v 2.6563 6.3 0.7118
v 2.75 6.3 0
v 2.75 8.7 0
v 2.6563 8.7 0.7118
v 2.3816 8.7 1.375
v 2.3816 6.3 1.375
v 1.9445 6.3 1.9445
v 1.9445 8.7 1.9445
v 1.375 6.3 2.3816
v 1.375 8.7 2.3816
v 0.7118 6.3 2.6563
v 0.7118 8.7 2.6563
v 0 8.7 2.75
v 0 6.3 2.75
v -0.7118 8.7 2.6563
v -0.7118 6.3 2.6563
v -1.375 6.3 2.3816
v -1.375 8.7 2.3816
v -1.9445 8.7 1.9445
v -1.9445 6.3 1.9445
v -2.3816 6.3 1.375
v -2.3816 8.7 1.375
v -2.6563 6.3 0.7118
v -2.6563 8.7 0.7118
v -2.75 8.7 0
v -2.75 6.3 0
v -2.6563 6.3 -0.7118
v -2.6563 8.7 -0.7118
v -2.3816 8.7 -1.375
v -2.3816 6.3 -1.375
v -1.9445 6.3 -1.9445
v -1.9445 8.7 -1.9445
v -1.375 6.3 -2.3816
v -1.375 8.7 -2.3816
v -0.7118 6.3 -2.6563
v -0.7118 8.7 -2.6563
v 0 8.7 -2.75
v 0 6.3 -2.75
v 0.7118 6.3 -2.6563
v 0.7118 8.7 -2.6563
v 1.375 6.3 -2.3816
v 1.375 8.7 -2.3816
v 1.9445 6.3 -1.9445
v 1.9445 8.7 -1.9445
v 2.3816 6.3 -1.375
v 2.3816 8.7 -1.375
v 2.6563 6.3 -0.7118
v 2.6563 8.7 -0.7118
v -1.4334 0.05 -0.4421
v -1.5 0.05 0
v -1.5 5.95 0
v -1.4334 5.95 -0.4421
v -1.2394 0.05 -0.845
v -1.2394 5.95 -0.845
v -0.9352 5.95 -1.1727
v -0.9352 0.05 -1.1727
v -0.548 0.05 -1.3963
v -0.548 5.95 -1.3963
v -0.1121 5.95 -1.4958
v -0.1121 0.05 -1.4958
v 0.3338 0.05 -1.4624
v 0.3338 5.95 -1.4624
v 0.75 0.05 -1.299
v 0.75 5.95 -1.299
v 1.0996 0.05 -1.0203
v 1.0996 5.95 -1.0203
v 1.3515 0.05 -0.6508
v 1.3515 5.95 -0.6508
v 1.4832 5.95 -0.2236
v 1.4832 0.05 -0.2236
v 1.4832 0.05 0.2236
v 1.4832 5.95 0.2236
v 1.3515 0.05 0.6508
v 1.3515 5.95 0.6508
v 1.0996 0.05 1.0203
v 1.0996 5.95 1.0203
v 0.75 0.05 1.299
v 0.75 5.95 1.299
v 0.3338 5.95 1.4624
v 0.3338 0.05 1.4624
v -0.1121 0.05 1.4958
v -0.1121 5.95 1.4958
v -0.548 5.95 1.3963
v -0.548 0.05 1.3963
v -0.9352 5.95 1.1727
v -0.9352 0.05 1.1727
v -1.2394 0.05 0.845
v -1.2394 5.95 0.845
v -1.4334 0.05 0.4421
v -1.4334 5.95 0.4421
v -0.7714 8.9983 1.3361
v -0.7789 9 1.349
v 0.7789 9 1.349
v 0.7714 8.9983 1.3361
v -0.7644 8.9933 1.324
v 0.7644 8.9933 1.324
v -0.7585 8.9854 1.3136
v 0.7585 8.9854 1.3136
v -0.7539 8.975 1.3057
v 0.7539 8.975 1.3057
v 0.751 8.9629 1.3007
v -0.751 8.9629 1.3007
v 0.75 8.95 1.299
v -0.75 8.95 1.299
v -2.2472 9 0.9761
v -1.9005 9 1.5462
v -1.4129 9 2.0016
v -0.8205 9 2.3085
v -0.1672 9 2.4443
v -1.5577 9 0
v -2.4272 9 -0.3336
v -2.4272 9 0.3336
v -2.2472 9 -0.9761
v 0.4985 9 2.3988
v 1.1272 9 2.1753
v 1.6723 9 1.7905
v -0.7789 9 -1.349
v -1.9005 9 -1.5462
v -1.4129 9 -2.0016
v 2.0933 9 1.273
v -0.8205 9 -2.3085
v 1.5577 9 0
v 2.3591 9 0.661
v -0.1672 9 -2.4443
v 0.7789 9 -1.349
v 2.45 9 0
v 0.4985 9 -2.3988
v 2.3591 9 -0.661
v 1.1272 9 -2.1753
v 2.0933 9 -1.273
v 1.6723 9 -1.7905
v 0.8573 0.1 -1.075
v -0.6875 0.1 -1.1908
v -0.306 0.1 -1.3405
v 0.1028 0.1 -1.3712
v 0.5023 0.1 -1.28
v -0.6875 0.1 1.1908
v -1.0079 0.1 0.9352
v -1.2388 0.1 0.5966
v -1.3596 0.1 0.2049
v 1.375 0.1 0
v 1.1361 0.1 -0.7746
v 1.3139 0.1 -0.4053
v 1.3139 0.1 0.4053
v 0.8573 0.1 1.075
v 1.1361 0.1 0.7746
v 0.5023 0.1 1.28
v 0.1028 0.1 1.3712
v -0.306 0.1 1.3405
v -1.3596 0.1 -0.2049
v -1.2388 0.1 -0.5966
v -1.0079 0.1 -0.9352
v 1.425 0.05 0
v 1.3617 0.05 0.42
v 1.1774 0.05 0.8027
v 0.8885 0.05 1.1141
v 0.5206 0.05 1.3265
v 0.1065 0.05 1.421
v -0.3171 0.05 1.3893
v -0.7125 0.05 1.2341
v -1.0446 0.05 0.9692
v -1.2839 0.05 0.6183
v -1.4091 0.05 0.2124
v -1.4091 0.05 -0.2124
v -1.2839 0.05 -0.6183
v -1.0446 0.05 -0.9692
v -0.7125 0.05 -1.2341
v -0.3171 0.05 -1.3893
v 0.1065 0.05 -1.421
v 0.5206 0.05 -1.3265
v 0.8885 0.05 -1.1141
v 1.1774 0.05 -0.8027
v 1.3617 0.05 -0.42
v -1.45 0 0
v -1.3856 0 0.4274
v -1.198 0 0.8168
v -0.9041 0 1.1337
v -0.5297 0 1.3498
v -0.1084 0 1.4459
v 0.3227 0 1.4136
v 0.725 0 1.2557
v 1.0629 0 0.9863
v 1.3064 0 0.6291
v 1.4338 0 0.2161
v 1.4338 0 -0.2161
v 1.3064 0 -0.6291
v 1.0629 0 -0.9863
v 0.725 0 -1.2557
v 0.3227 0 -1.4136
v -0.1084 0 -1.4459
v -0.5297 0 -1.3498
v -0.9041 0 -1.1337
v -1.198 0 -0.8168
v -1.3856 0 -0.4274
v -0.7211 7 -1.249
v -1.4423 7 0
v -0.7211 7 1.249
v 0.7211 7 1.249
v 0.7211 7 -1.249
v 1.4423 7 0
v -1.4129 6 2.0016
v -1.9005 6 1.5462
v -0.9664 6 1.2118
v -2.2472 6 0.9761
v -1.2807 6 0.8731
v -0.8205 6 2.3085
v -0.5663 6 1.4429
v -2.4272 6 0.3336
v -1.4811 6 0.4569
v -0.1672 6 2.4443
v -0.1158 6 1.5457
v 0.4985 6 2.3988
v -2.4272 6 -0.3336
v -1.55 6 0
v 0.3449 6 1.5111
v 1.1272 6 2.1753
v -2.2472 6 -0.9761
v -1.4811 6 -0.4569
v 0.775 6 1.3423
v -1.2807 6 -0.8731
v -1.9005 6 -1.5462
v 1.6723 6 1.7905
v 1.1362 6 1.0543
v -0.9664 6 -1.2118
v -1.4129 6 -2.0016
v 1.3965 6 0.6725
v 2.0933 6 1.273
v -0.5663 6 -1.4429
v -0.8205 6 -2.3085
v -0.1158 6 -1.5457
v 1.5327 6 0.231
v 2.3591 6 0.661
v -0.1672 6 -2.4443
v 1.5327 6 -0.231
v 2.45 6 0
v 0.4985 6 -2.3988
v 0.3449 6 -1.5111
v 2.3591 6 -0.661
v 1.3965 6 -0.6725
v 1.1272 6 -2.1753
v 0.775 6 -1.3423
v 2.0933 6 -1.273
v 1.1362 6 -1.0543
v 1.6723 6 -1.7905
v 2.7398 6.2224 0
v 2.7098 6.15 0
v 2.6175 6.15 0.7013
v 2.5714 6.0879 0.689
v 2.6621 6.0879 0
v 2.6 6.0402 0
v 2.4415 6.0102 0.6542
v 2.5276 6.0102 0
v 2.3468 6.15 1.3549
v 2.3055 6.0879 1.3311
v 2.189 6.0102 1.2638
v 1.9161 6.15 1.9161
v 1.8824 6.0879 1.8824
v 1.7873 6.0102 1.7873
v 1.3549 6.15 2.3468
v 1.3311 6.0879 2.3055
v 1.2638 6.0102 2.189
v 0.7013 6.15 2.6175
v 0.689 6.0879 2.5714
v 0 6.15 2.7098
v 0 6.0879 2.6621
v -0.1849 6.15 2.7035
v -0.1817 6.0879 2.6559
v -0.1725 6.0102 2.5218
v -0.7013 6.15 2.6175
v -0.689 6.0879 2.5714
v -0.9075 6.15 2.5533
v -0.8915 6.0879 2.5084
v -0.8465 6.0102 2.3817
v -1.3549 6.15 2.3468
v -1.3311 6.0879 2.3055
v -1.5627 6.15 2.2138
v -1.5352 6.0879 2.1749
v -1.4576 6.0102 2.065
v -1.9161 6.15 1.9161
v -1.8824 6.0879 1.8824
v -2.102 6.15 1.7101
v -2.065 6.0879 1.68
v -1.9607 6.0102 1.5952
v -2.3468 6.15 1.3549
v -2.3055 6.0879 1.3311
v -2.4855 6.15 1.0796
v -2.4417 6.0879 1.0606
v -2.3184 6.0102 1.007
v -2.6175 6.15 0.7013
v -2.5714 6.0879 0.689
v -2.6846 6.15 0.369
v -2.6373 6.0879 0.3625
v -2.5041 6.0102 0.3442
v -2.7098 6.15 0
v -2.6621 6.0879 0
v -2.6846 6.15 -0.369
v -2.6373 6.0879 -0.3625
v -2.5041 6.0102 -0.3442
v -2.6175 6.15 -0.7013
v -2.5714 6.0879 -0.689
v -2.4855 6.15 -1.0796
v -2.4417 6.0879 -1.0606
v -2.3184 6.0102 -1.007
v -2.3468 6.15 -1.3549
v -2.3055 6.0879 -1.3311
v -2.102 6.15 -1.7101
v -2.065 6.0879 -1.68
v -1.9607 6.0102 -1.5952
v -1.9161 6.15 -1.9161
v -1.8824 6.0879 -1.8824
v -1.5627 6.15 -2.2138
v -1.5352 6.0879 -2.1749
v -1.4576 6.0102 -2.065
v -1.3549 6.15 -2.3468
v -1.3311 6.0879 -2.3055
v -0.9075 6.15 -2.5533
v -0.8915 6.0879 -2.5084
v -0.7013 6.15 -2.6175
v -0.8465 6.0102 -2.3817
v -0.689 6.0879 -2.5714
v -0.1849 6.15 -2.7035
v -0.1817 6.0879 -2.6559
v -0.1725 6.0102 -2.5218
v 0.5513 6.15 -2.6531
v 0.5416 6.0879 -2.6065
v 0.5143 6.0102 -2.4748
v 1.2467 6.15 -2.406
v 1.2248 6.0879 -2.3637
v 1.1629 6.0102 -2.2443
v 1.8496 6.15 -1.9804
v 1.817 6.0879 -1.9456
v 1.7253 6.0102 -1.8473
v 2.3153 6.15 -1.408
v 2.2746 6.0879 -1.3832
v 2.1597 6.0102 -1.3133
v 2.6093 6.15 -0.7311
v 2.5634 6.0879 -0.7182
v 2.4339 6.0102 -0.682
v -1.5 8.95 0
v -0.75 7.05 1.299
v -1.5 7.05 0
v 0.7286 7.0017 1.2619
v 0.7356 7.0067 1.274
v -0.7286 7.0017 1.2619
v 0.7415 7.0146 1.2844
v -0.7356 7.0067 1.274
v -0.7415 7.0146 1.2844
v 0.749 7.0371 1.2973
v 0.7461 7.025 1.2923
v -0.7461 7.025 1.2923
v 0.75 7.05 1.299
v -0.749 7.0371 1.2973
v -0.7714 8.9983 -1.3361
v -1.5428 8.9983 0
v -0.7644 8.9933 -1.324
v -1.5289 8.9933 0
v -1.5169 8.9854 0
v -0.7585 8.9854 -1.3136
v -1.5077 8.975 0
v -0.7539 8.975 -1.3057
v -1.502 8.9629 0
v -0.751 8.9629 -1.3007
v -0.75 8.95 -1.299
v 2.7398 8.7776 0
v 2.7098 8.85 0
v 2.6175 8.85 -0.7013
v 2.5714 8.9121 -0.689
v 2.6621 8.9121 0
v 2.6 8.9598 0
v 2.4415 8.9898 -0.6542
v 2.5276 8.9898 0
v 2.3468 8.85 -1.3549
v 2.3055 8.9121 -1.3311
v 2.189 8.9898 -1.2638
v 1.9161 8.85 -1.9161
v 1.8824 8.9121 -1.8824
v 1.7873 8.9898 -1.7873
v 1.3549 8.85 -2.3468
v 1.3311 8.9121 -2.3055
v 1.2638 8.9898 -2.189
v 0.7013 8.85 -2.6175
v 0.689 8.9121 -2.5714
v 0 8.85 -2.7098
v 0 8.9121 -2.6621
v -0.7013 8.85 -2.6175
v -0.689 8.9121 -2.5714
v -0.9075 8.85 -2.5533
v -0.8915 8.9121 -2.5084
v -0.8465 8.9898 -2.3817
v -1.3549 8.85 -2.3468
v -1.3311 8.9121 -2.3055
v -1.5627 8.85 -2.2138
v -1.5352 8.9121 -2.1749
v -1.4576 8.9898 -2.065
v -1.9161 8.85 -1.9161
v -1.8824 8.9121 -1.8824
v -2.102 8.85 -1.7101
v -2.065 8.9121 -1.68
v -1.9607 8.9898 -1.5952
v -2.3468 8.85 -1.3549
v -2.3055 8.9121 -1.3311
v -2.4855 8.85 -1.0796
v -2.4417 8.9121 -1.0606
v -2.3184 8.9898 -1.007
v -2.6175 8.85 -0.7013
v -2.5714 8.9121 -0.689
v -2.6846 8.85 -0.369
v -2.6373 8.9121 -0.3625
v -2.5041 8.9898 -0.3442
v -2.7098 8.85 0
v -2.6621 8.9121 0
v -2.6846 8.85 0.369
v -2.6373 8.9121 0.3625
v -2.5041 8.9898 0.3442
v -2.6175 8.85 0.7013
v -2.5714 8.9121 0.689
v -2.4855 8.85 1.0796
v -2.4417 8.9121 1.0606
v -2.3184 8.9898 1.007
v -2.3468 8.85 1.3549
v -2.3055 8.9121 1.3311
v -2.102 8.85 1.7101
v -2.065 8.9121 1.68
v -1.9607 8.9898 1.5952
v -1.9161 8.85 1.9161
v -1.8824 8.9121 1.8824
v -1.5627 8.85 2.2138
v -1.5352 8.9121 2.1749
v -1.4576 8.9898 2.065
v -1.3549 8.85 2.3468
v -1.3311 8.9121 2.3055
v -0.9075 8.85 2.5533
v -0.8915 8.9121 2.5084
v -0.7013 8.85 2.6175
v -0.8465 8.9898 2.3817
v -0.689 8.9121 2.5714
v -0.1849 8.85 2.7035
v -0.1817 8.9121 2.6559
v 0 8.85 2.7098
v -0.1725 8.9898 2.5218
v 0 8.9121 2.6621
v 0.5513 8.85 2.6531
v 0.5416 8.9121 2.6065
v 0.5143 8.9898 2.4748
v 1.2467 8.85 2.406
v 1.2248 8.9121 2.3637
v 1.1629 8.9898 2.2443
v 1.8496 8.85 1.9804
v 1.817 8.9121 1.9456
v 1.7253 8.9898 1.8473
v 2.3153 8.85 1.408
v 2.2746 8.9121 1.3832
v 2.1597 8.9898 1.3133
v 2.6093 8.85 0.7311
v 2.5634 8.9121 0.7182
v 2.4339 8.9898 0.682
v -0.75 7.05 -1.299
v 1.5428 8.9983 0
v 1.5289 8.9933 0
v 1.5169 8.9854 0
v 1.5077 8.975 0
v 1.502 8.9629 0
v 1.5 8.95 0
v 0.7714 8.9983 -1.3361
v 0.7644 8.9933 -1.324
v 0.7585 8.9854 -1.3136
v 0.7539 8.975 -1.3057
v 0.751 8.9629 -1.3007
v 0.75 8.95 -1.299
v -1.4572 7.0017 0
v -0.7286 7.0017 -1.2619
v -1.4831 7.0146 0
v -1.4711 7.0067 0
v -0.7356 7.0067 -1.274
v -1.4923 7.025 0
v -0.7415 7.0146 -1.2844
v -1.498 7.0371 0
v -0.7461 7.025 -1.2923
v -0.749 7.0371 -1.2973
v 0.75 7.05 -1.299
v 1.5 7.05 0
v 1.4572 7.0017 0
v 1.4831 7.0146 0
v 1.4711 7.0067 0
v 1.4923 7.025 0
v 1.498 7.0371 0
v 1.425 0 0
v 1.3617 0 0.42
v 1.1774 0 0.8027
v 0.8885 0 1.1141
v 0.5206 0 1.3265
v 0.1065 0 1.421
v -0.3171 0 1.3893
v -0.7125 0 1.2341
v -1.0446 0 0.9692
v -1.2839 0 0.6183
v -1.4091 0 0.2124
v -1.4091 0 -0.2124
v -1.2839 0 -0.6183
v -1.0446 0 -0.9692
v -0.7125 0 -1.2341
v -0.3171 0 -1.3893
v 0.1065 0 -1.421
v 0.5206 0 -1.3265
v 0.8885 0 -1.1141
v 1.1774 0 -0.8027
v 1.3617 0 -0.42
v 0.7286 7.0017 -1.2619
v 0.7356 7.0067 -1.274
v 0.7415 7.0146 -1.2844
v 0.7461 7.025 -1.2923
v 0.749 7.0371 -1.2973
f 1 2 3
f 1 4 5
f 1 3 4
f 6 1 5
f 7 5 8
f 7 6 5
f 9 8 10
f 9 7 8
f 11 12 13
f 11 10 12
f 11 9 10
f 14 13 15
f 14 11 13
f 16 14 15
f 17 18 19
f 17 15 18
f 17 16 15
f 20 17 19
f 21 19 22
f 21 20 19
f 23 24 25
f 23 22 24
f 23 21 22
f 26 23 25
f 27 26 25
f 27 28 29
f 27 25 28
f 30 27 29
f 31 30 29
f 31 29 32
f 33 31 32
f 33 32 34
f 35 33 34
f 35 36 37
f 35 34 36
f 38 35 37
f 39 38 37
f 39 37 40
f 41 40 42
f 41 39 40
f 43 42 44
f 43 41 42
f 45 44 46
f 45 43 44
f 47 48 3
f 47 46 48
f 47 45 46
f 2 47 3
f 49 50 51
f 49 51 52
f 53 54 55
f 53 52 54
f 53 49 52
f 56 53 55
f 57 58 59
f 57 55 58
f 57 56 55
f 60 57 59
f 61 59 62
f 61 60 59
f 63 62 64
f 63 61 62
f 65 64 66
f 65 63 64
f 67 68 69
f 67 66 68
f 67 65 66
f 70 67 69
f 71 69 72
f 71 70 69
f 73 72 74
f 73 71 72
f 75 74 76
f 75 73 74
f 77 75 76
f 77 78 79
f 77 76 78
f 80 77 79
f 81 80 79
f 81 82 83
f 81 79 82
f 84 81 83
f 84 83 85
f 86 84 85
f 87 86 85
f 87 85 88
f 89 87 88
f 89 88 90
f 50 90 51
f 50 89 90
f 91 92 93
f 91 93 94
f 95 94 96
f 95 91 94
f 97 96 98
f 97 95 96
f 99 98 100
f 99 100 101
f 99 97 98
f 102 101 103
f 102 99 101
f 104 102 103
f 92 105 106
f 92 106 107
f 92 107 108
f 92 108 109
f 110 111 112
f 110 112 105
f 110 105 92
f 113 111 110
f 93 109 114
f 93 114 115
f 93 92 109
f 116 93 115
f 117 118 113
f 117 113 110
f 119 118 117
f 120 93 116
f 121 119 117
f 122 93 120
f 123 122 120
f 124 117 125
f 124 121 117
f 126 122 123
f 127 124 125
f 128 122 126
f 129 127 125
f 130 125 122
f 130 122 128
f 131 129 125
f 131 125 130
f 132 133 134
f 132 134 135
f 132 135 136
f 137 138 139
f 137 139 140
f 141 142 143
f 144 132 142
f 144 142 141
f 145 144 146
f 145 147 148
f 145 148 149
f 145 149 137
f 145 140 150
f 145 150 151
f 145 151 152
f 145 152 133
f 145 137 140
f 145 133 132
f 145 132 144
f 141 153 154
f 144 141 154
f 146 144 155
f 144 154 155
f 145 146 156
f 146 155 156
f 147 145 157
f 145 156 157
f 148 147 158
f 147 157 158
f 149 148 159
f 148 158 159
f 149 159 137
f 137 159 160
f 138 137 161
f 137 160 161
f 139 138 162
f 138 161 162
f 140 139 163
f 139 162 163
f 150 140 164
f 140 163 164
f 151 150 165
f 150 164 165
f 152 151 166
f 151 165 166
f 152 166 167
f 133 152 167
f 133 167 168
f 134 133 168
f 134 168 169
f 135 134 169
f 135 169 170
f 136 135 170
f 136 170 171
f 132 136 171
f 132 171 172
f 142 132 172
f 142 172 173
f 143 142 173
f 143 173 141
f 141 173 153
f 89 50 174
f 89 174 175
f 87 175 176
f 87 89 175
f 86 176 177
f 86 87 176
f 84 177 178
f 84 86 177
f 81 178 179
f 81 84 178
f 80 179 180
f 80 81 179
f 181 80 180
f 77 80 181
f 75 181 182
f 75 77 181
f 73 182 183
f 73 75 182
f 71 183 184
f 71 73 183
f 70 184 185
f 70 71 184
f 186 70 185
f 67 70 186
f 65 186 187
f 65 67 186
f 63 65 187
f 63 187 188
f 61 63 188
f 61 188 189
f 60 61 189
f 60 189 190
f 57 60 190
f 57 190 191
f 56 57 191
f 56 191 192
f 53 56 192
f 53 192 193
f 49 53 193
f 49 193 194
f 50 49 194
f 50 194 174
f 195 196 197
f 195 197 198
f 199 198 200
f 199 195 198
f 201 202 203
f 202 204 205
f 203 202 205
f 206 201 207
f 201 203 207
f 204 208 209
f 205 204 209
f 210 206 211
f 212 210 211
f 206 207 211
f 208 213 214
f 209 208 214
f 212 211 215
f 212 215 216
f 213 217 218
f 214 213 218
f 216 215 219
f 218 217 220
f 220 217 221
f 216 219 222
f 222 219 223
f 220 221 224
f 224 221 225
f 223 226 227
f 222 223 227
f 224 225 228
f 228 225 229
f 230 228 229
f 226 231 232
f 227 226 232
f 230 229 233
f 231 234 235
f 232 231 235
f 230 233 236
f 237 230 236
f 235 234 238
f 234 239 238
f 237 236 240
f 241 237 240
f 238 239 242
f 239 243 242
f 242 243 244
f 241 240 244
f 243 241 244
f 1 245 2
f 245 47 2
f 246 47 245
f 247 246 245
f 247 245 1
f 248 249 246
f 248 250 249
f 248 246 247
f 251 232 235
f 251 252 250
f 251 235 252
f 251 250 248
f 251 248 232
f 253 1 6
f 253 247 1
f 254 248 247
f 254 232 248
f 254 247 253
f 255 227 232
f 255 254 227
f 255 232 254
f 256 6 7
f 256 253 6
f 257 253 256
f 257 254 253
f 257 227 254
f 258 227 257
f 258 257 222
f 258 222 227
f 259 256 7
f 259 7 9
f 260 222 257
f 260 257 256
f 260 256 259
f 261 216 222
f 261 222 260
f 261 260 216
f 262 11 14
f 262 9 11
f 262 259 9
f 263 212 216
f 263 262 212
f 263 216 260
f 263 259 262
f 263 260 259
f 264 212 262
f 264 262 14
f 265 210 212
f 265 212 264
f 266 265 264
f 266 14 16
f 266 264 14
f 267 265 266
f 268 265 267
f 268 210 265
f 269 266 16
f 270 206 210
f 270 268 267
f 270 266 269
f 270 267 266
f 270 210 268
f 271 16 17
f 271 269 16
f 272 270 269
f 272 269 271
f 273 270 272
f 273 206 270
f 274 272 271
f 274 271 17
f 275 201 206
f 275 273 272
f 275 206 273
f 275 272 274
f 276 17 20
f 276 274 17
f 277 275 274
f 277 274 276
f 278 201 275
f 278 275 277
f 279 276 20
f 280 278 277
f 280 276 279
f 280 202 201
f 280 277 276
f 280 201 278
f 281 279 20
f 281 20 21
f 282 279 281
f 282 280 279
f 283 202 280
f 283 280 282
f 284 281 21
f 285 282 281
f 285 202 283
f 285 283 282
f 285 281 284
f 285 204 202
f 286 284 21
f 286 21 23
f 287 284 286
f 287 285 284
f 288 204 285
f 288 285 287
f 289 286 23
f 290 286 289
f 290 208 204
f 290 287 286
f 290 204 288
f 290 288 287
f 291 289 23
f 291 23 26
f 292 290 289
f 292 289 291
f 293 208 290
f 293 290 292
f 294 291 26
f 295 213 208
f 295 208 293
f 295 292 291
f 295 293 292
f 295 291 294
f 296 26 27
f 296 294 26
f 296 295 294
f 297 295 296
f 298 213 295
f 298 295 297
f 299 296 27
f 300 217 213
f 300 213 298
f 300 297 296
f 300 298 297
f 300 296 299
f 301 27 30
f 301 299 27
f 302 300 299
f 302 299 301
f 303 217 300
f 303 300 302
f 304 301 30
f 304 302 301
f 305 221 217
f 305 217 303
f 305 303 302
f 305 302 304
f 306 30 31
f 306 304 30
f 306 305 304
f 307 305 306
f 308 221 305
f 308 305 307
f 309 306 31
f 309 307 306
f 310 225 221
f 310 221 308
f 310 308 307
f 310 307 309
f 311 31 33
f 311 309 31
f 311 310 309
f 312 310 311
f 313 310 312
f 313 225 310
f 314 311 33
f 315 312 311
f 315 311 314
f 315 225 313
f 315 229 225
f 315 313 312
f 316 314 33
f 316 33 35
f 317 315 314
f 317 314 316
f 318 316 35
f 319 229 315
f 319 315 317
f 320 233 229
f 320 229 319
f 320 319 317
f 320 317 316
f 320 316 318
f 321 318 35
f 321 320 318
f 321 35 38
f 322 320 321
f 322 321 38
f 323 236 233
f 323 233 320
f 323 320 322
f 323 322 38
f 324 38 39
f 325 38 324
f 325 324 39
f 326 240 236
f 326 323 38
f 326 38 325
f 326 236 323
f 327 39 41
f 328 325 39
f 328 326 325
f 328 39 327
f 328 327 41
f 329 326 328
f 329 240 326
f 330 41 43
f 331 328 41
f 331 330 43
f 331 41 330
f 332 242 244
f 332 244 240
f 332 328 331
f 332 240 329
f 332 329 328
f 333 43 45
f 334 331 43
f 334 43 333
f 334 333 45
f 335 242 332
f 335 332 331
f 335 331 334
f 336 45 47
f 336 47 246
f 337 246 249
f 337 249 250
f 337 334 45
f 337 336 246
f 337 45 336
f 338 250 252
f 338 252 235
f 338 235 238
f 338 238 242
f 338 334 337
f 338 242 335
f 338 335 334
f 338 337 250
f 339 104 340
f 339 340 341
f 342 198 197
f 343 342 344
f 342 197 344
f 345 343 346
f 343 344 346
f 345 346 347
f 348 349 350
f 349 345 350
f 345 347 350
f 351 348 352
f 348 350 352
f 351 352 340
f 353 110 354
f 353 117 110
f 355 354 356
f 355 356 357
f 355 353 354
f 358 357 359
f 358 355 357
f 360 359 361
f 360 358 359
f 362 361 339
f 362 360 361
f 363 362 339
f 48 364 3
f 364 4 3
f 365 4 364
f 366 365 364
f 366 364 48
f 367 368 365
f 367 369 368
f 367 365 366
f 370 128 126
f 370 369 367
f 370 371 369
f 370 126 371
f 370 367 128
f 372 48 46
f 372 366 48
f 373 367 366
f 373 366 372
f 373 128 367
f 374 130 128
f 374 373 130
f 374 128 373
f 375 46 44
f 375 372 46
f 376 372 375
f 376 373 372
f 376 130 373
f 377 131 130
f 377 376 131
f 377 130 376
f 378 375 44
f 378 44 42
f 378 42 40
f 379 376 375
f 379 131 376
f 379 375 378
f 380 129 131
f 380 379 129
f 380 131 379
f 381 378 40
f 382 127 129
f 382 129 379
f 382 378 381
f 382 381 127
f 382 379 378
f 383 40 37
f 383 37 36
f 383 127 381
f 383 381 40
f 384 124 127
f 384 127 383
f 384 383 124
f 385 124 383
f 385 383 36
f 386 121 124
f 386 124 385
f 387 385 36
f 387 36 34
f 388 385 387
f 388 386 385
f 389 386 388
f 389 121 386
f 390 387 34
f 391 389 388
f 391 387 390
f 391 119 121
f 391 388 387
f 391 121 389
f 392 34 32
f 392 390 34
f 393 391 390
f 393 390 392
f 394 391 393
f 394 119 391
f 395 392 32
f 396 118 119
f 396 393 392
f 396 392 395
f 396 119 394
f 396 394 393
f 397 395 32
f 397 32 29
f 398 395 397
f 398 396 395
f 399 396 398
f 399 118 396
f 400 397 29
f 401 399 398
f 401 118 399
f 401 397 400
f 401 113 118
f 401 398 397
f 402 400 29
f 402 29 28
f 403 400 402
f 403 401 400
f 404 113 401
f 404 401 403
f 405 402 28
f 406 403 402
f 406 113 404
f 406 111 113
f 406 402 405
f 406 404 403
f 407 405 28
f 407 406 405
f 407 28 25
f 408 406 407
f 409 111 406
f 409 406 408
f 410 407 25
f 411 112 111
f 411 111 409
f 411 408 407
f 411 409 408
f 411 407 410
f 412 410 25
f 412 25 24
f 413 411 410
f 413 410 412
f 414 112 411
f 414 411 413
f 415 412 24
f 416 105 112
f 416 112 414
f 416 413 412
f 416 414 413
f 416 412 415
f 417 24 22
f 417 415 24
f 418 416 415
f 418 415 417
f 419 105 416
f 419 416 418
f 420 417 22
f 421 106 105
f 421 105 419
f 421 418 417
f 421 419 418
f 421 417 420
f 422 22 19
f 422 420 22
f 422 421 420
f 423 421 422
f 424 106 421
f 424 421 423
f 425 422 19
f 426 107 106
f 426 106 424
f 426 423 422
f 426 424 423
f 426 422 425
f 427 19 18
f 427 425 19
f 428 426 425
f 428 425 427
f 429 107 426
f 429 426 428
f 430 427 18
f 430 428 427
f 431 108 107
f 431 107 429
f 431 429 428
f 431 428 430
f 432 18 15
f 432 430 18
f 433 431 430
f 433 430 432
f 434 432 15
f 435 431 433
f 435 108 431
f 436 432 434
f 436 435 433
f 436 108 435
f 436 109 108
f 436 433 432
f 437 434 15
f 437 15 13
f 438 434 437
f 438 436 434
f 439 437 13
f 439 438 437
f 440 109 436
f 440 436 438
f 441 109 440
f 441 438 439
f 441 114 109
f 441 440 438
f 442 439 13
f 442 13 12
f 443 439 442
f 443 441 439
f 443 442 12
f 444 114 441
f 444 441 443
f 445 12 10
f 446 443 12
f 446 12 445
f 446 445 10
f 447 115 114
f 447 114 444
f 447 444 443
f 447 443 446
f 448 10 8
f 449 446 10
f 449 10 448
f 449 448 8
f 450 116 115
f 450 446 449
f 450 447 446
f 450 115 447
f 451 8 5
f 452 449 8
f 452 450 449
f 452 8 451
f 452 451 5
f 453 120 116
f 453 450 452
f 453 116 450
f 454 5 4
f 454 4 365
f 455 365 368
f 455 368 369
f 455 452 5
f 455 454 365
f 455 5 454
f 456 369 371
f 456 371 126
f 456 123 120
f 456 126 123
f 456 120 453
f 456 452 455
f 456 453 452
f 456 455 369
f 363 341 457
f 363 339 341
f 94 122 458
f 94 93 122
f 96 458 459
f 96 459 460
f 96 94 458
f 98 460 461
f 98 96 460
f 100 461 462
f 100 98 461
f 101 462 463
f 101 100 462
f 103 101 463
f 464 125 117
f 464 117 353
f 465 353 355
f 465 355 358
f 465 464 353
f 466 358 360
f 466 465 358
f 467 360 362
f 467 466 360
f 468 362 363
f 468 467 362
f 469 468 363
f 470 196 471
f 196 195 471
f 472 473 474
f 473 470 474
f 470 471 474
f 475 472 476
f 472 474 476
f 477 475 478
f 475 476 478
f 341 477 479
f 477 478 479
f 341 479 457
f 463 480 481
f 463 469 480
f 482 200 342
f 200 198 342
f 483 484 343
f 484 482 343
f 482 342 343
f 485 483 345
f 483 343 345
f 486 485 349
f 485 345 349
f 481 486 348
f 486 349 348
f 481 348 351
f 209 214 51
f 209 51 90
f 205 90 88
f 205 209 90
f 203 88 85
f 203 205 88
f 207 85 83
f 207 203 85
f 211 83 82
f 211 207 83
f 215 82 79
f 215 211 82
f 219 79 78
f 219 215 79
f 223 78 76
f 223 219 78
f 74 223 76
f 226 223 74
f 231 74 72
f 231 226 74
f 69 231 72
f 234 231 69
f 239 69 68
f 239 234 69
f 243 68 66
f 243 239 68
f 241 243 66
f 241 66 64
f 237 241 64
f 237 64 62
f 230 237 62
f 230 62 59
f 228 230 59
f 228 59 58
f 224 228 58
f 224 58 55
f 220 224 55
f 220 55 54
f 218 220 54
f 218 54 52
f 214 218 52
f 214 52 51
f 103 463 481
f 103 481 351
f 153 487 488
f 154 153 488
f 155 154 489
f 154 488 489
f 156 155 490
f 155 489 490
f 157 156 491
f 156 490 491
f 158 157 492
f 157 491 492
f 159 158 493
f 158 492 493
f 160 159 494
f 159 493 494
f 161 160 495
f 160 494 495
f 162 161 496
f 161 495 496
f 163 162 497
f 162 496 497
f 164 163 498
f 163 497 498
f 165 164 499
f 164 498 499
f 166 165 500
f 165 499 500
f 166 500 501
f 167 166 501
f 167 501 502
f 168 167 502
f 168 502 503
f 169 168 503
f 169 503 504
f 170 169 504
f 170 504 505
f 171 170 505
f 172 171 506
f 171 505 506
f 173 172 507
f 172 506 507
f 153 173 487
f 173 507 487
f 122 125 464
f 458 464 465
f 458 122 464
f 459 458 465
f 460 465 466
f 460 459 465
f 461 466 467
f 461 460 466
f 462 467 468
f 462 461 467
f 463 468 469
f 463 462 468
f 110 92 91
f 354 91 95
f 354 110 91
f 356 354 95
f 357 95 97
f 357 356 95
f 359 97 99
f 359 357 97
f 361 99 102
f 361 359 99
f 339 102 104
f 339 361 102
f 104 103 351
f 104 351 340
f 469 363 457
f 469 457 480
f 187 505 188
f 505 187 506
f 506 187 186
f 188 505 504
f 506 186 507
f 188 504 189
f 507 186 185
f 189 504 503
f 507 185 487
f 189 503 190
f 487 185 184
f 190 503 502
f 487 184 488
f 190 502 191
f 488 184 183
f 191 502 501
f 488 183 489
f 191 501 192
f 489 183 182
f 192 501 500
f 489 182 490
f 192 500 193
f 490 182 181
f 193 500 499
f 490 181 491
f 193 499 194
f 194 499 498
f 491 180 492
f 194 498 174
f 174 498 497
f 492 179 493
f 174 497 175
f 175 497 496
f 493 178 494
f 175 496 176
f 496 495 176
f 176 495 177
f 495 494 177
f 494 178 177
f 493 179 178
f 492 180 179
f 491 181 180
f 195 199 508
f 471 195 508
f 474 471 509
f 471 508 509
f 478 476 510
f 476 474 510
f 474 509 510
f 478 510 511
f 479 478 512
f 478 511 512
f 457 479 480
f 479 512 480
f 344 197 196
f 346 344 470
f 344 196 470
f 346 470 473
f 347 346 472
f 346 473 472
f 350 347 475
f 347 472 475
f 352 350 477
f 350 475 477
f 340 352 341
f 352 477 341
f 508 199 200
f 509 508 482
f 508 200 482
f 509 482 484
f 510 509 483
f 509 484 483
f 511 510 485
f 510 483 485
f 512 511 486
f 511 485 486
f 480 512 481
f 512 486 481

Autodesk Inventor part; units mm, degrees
ref_plane "YZ Plane" through (0, 0, 0) normal (1, 0, 0) x (0, 1, 0)
ref_plane "XZ Plane" through (0, 0, 0) normal (0, 1, 0) x (-1, 0, 0)
ref_plane "XY Plane" through (0, 0, 0) normal (0, 0, 1) x (1, 0, 0)
sketch "Sketch1" plane through (0, 0, 0) normal (0, 1, 0) x (-1, 0, 0)
  circle A0 centre (0, 0) radius 1.5
  dimension "d1" = 3
extrude "Extrusion1" add sketch "Sketch1" along normal blind 6
sketch "Sketch2" plane through (0, 6, 0) normal (0, 1, 0) x (1, 0, 0)
  circle A0 centre (0, 0) radius 2.75
  dimension "d4" = 5.5
extrude "Extrusion2" add sketch "Sketch2" along normal blind 3
sketch "Sketch3" plane through (0, 9, 0) normal (0, 1, 0) x (1, 0, 0)
  line L0 (1.5, 0) -> (0.75, -1.299)
  line L1 (0.75, -1.299) -> (-0.75, -1.299)
  line L2 (-0.75, -1.299) -> (-1.5, 0)
  line L3 (-1.5, 0) -> (-0.75, 1.299)
  line L4 (-0.75, 1.299) -> (0.75, 1.299)
  line L5 (0.75, 1.299) -> (1.5, 0)
  point P0 (0, 0)
  point P1 (0, 0)
  dimension "d7" = 1.5
extrude "Extrusion3" cut sketch "Sketch3" against normal blind 2
thread "Thread1" size "M3x0.35" class "6g" standard "ISO Metric profile" length 6
fillet "Fillet1" radius 0.3 2 edges at (-2.75, 6, 0) (-2.75, 9, 0)
chamfer "Chamfer1" distance 0.05 angle 45 1 edges at (1.5, 0, 0)
chamfer "Chamfer2" distance 0.05 angle 45 1 edges at (1.5, 6, 0)
fillet "Fillet2" radius 0.05 12 edges at (0, 9, -1.299) (1.125, 9, -0.6495) (1.125, 9, 0.6495) (0, 9, 1.299) (-1.125, 9, 0.6495) (-1.125, 9, -0.6495) (0, 7, -1.299) (1.125, 7, -0.6495) (1.125, 7, 0.6495) (-1.125, 7, -0.6495) (-1.125, 7, 0.6495) (0, 7, 1.299)
sketch "Sketch4" plane through (0, 0, 0) normal (0, -1, 0) x (1, 0, 0)
  circle A0 centre (0, 0) radius 1.425
  dimension "d21" = 2.85
extrude "Extrusion4" cut sketch "Sketch4" against normal blind 0.1
chamfer "Chamfer3" distance 0.05 angle 45 1 edges at (-1.425, 0.1, 0)
properties part number "L Bolt M3 x 6 Stainless Steel"
